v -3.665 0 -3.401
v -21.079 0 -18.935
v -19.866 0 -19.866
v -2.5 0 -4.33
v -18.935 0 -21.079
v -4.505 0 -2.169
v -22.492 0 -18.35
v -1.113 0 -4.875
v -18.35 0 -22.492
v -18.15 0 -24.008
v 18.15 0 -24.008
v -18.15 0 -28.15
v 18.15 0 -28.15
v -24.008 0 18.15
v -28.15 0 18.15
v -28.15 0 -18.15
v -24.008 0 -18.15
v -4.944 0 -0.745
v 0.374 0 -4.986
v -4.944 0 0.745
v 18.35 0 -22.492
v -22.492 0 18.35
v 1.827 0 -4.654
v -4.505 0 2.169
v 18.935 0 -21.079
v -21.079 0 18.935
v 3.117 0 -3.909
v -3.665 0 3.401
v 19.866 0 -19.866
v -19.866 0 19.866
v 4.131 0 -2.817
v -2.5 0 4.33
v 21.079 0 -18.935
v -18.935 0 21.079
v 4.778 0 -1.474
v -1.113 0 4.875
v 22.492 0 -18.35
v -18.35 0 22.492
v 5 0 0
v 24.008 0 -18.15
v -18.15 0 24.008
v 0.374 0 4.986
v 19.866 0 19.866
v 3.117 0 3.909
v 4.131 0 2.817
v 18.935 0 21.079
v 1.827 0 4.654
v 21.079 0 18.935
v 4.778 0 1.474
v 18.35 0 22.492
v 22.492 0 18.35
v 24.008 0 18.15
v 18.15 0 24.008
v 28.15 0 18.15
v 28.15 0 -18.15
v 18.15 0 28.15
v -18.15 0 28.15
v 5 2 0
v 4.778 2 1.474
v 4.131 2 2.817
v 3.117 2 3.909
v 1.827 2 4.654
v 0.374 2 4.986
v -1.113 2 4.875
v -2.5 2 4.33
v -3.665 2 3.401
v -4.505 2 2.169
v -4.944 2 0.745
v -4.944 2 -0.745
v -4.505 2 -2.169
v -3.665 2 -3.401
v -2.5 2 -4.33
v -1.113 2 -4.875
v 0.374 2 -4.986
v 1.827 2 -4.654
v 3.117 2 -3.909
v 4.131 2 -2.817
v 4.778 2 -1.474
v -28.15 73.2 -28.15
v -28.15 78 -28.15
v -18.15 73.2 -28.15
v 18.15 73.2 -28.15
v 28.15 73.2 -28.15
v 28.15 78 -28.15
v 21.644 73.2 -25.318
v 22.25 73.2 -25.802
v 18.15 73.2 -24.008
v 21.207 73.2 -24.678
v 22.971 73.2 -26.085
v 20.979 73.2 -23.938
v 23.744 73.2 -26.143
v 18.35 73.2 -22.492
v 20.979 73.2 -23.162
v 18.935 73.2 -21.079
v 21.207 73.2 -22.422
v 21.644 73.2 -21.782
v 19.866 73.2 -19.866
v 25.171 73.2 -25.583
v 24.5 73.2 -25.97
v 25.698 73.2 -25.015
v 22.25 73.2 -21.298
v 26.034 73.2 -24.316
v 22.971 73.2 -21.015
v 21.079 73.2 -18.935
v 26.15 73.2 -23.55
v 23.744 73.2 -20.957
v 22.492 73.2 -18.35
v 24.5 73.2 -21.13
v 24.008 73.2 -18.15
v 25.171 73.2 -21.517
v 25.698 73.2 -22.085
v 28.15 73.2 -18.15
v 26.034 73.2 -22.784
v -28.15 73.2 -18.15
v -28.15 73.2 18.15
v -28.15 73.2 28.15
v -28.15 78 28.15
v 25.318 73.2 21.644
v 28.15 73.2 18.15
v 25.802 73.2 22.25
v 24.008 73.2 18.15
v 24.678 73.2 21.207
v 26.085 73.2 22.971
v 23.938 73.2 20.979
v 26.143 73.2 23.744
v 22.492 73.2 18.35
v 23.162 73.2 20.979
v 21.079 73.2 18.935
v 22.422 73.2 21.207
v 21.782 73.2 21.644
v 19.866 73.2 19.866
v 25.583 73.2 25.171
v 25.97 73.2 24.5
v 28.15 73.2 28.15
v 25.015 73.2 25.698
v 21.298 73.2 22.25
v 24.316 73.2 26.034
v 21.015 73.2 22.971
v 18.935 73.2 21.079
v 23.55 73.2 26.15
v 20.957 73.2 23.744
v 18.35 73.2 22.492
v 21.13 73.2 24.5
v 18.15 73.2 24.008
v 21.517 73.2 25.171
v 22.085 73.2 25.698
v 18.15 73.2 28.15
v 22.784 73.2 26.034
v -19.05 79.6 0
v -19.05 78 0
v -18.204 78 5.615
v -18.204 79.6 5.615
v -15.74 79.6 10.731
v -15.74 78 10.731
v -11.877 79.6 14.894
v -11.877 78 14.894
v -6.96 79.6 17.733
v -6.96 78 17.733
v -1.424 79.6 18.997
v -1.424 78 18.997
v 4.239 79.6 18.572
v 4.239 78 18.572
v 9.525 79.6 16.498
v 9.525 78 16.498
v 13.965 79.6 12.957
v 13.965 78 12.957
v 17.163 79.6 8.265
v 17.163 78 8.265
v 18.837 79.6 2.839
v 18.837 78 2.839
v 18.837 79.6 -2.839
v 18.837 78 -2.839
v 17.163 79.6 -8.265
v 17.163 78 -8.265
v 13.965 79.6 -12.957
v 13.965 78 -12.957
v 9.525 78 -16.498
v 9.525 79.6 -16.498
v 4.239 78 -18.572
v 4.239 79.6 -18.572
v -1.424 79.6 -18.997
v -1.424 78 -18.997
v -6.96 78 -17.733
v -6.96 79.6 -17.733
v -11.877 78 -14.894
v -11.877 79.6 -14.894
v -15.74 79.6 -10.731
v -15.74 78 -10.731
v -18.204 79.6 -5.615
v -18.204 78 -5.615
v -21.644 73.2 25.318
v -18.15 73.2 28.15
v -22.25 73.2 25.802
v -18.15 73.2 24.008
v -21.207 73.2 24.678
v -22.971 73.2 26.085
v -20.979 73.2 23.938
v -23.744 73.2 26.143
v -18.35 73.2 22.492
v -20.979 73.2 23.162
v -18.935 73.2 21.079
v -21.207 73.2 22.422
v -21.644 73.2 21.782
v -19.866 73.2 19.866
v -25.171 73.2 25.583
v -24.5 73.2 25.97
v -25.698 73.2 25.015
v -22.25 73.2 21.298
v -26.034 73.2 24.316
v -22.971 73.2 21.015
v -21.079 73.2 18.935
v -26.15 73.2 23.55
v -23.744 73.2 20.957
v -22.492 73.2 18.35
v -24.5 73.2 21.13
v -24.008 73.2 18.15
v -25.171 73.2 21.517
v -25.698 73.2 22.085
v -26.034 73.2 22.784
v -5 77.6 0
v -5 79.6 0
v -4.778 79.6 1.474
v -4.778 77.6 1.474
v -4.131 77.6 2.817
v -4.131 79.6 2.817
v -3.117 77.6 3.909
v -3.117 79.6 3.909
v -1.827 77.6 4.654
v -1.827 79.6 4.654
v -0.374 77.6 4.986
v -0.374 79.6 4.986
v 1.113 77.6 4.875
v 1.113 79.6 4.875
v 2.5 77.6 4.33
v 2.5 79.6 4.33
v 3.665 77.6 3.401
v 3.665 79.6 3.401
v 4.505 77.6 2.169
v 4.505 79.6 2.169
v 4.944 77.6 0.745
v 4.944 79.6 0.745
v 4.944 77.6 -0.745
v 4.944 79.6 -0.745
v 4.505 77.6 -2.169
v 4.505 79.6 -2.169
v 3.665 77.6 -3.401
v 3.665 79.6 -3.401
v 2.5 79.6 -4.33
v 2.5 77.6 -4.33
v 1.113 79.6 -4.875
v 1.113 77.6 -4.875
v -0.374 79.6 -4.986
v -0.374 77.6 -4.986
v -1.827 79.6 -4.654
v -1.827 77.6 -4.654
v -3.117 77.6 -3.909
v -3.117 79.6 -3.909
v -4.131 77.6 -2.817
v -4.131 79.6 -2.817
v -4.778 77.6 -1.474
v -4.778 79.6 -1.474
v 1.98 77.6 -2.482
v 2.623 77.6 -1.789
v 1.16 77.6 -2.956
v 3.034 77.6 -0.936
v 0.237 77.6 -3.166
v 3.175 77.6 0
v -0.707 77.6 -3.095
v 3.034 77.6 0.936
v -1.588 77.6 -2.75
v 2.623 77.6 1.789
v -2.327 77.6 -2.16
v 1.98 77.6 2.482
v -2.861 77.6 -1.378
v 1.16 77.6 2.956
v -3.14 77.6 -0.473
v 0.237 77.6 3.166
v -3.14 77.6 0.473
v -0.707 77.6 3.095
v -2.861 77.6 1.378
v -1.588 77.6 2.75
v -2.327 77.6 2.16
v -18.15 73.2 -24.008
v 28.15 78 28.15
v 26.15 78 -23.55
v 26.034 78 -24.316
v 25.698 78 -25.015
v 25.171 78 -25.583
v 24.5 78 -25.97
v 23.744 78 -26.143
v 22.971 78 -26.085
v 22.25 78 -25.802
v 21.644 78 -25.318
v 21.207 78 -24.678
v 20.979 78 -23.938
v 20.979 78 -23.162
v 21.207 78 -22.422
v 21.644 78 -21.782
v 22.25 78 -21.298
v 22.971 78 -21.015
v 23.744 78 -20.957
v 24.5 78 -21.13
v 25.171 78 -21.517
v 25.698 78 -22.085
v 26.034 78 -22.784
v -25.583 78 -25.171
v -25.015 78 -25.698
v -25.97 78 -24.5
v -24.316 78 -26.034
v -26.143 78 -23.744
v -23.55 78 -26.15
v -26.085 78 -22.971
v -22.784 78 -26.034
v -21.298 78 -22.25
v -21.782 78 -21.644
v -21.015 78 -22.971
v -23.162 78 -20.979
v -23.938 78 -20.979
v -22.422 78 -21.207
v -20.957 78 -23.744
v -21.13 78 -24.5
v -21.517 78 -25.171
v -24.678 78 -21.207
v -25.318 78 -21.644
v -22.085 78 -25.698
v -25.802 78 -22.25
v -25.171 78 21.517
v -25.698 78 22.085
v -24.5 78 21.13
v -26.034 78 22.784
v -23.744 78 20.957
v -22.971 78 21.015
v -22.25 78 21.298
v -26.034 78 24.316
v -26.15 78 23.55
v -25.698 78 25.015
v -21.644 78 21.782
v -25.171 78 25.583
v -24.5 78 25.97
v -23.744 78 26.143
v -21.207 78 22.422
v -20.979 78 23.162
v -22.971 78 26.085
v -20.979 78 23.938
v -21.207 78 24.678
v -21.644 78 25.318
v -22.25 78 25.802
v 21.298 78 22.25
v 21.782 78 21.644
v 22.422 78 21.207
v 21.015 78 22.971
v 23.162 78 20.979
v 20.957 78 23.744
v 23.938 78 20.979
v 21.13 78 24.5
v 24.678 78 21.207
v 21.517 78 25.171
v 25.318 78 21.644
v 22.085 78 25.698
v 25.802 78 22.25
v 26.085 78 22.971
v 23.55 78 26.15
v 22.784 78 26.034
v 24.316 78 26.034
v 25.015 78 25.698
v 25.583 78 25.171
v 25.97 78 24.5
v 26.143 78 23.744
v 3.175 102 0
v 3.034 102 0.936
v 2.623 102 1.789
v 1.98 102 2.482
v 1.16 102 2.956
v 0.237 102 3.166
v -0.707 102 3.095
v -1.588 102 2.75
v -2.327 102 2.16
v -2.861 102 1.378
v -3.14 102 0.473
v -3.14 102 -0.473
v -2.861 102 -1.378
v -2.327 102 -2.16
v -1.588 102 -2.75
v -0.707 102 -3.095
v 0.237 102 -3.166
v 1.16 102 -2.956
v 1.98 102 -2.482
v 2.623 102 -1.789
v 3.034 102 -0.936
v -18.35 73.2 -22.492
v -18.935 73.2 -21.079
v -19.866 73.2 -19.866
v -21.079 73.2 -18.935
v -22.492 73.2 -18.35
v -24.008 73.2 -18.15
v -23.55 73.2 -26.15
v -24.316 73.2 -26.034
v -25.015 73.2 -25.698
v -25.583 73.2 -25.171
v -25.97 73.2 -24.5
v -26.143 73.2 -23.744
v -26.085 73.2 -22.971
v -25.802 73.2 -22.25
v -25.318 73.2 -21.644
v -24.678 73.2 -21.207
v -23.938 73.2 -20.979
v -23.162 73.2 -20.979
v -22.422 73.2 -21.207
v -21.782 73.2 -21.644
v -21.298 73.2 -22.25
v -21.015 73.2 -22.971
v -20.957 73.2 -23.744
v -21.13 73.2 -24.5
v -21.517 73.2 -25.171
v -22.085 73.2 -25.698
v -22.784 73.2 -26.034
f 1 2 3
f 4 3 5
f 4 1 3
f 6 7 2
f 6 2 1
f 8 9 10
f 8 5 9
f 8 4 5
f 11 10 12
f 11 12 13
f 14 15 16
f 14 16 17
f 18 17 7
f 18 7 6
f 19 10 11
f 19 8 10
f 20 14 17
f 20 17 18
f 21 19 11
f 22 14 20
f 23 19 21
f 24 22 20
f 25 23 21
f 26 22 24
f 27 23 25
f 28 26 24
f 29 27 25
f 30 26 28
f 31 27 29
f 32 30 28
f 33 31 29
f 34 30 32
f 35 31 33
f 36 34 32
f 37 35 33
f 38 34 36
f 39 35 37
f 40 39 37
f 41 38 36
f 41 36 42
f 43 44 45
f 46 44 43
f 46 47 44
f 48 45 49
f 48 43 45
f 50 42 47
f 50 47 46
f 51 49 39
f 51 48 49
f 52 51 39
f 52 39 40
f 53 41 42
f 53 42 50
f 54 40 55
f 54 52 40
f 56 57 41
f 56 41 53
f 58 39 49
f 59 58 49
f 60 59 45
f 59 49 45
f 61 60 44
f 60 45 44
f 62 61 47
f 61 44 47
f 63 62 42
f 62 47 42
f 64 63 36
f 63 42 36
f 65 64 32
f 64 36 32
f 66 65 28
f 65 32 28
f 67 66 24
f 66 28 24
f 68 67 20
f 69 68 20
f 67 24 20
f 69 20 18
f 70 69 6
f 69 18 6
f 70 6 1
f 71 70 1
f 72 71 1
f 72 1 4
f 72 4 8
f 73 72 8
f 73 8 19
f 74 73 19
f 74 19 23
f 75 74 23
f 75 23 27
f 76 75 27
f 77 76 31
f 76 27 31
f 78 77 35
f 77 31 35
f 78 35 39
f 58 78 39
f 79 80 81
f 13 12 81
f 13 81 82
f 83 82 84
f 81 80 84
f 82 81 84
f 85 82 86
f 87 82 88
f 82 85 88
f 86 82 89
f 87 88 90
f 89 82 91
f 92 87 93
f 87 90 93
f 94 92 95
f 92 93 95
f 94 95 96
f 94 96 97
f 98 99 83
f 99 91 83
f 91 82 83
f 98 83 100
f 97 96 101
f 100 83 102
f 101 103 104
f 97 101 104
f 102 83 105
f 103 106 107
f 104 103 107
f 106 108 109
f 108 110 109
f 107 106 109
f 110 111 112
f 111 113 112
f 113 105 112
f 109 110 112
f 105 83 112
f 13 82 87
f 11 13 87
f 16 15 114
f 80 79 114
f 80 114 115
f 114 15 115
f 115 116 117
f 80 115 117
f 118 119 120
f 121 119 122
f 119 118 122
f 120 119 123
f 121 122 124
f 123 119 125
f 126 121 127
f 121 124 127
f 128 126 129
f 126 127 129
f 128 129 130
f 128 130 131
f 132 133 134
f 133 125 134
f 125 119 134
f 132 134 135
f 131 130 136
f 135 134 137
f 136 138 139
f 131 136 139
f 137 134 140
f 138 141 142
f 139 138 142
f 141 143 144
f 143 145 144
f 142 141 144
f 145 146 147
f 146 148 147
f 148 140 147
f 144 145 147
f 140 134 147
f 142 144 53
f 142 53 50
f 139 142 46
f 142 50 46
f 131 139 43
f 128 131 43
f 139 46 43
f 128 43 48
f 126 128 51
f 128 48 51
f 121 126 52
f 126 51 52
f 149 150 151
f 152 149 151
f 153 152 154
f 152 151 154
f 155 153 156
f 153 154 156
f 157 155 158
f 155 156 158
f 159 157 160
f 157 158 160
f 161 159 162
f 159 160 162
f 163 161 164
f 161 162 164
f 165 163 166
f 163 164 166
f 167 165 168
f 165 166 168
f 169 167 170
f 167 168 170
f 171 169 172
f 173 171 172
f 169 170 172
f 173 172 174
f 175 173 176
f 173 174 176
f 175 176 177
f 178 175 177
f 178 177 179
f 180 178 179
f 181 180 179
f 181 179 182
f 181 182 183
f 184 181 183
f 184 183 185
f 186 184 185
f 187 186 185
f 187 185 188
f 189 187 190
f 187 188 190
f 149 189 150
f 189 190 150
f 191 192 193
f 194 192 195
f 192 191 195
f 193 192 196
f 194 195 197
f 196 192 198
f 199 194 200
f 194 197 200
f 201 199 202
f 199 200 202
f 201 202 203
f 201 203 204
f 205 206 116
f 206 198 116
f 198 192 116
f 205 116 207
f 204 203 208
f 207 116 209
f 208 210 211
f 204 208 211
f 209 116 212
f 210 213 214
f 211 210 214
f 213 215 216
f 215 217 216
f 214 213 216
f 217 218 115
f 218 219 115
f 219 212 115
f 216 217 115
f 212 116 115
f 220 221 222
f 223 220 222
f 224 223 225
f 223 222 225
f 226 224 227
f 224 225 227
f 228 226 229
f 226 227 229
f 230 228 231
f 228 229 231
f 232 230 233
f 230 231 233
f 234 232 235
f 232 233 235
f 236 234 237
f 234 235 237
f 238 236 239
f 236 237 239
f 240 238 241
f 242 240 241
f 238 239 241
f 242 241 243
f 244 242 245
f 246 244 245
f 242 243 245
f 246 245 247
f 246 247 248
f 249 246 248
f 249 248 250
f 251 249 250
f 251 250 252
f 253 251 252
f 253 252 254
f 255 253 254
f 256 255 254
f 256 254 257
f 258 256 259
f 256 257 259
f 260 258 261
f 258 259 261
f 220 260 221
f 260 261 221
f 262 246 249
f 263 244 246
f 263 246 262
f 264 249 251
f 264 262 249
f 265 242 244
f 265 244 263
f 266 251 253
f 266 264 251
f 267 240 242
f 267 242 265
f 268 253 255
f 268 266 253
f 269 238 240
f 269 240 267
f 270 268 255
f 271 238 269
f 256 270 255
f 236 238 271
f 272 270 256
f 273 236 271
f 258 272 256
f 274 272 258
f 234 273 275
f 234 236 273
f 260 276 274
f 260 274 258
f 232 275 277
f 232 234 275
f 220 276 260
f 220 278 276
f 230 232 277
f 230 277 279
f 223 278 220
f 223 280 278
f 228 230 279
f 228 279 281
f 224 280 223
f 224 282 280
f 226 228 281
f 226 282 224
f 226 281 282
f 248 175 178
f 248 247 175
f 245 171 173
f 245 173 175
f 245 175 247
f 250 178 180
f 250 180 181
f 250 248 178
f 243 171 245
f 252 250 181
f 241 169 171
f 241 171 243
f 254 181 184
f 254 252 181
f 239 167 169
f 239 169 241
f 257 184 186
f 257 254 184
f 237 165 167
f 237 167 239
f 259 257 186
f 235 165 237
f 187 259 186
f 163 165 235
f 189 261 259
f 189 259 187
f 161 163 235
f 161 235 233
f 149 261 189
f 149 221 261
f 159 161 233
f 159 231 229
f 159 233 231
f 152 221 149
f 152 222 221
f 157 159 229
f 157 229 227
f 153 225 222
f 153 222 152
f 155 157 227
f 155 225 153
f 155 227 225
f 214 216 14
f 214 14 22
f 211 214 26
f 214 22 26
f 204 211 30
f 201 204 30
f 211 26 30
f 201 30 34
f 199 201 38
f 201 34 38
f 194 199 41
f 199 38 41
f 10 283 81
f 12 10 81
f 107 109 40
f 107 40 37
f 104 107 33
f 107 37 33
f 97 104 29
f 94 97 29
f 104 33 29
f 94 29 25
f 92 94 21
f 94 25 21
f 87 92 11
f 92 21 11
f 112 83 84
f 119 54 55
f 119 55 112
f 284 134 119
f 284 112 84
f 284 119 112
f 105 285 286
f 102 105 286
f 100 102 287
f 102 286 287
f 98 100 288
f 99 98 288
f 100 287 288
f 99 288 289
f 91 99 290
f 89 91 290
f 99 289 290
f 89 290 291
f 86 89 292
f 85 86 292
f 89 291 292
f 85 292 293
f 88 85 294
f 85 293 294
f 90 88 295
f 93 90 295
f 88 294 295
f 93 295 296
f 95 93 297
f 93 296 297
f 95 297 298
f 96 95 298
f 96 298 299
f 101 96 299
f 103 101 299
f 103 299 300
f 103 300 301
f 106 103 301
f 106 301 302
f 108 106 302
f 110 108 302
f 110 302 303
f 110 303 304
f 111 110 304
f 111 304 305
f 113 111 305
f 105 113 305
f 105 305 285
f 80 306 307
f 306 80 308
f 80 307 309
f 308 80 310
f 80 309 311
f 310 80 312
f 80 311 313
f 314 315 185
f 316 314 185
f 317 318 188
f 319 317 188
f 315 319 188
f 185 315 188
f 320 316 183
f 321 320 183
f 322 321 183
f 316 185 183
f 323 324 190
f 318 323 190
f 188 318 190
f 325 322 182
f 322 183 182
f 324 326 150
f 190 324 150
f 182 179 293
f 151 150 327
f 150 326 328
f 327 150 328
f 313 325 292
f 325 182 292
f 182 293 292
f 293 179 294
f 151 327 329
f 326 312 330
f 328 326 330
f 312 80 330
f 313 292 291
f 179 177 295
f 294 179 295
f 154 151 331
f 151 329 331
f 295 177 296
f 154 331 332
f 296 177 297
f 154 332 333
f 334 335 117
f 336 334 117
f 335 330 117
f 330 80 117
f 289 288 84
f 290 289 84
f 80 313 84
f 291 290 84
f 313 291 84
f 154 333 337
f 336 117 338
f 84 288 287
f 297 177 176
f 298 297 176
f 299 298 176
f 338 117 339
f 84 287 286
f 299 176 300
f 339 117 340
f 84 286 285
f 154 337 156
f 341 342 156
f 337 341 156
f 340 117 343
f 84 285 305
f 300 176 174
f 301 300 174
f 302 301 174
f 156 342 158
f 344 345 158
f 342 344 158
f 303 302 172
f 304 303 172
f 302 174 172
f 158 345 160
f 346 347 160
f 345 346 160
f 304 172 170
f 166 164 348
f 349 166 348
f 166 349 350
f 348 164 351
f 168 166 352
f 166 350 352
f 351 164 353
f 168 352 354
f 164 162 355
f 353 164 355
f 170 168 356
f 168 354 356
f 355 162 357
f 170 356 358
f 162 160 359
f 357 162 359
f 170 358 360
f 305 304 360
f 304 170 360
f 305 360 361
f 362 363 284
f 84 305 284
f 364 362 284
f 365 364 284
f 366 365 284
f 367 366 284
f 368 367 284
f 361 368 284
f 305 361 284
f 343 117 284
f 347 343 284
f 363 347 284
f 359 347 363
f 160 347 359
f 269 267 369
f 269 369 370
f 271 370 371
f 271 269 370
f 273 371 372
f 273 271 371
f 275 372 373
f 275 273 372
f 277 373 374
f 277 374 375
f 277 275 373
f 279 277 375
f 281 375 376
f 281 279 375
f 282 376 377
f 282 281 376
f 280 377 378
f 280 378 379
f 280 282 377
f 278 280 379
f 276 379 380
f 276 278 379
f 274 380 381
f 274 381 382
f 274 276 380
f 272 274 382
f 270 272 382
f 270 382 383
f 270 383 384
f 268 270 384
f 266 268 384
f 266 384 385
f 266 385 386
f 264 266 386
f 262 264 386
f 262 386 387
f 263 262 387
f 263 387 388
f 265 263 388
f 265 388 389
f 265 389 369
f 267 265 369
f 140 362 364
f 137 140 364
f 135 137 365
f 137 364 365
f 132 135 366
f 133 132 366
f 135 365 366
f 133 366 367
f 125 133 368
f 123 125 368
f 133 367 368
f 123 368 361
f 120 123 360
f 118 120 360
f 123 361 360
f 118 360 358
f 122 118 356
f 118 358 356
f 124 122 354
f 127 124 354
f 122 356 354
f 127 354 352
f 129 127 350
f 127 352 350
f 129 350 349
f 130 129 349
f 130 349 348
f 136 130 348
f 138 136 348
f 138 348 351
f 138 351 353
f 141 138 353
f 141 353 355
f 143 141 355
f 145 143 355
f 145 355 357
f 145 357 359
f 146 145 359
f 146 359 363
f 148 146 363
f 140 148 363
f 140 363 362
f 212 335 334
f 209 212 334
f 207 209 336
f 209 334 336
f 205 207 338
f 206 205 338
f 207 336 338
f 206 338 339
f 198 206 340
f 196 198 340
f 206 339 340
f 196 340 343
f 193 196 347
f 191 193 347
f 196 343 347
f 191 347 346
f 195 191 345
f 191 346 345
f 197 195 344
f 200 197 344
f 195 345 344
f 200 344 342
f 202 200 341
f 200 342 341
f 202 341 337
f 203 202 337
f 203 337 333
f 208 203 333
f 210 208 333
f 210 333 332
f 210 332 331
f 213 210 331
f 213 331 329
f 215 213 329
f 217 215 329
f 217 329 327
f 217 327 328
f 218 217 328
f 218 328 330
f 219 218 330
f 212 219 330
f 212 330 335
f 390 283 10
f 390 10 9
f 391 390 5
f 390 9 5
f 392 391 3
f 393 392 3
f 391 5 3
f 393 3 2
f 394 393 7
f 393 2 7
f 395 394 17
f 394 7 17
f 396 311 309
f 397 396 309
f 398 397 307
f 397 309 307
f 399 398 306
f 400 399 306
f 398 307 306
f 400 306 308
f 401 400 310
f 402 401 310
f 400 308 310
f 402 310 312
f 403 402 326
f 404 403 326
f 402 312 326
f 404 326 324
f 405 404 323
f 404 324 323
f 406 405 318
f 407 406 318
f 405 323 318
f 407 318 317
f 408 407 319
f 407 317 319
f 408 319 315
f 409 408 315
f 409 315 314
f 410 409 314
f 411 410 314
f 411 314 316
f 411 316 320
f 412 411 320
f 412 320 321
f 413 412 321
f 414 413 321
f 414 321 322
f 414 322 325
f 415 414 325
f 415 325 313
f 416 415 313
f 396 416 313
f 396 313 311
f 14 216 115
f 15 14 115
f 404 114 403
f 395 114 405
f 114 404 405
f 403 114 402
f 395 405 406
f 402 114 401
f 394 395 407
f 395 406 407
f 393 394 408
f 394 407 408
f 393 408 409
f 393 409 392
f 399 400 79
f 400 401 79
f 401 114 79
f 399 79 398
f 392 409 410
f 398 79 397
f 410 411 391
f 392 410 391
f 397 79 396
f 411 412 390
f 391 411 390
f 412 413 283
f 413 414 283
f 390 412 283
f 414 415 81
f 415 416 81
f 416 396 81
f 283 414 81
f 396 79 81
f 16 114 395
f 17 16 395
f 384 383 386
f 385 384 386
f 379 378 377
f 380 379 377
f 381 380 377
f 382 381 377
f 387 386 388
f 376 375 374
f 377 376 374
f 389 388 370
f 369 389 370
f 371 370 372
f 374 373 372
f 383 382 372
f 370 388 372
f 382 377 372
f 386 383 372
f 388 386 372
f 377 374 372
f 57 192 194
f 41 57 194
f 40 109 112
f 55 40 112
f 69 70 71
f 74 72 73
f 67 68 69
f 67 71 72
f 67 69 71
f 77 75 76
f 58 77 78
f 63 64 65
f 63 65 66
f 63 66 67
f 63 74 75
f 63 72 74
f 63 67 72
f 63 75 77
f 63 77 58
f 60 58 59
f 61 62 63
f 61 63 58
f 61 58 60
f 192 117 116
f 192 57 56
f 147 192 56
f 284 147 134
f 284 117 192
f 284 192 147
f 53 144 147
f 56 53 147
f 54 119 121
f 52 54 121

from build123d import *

# Parameters (mm, degrees)
SKETCH_W              = 56.3
SKETCH_H              = 78
PAD_DEPTH             = 28.15
PAD_DEPTH_BACK        = 28.15
POCKET_DEPTH          = 73.2
POLARPATTERN_COUNT    = 4
SKETCH002_R           = 2.6
POCKET001_DEPTH       = 5
POLARPATTERN001_COUNT = 4
SKETCH003_R           = 19.05
PAD001_DEPTH          = 1.6
SKETCH004_R           = 5
POCKET002_DEPTH       = 2
SKETCH005_R           = 5
POCKET003_DEPTH       = 2
SKETCH006_R           = 3.175
PAD002_DEPTH          = 100


with BuildPart() as part:
    # Sketch → Pad (new body, two sides)
    with BuildSketch(Plane.XY) as pad_sk:
        with Locations((0, 39)):
            Rectangle(SKETCH_W, SKETCH_H)
    extrude(amount=PAD_DEPTH)
    extrude(pad_sk.sketch, amount=-PAD_DEPTH_BACK)

    # Sketch001 → Pocket (cut)
    with BuildSketch(Plane.XZ):
        with BuildLine():
            Line((18.15, 28.15), (28.15, 28.15))
            Line((28.15, 28.15), (28.15, 18.15))
            Line((28.15, 18.15), (24.007864, 18.15))
            ThreePointArc((18.15, 24.007864), (19.865729, 19.865729), (24.007864, 18.15))
            Line((18.15, 24.007864), (18.15, 28.15))
        make_face()
    pocket = extrude(amount=-POCKET_DEPTH, mode=Mode.SUBTRACT)

    # PolarPattern: Pocket ×4 about axis
    polarpattern_axis = Axis((0, 0, 0), (0, -1, 0))
    for i in range(1, POLARPATTERN_COUNT):
        add(pocket.rotate(polarpattern_axis, i * 360 / POLARPATTERN_COUNT), mode=Mode.SUBTRACT)

    # Sketch002 → Pocket001 (cut)
    with BuildSketch(Plane(origin=(0, 78, 0), x_dir=(-1, 0, 0), z_dir=(0, 1, 0))):
        with Locations((23.55, 23.55)):
            Circle(SKETCH002_R)
    pocket001 = extrude(amount=-POCKET001_DEPTH, mode=Mode.SUBTRACT)

    # PolarPattern001: Pocket001 ×4 about axis
    polarpattern001_axis = Axis((0, 78, 0), (0, 1, 0))
    for i in range(1, POLARPATTERN001_COUNT):
        add(pocket001.rotate(polarpattern001_axis, i * 360 / POLARPATTERN001_COUNT), mode=Mode.SUBTRACT)

    # Sketch003 → Pad001 (new body)
    with BuildSketch(Plane(origin=(0, 78, 0), x_dir=(-1, 0, 0), z_dir=(0, 1, 0))):
        Circle(SKETCH003_R)
    extrude(amount=PAD001_DEPTH)

    # Sketch004 → Pocket002 (cut)
    with BuildSketch(Plane(origin=(0, 79.6, 0), x_dir=(-1, 0, 0), z_dir=(0, 1, 0))):
        Circle(SKETCH004_R)
    extrude(amount=-POCKET002_DEPTH, mode=Mode.SUBTRACT)

    # Sketch005 → Pocket003 (cut)
    with BuildSketch(Plane.XZ):
        Circle(SKETCH005_R)
    extrude(amount=-POCKET003_DEPTH, mode=Mode.SUBTRACT)

    # Sketch006 → Pad002 (new body)
    with BuildSketch(Plane.XZ.offset(-2)):
        Circle(SKETCH006_R)
    extrude(amount=-PAD002_DEPTH)


solid = part.part
